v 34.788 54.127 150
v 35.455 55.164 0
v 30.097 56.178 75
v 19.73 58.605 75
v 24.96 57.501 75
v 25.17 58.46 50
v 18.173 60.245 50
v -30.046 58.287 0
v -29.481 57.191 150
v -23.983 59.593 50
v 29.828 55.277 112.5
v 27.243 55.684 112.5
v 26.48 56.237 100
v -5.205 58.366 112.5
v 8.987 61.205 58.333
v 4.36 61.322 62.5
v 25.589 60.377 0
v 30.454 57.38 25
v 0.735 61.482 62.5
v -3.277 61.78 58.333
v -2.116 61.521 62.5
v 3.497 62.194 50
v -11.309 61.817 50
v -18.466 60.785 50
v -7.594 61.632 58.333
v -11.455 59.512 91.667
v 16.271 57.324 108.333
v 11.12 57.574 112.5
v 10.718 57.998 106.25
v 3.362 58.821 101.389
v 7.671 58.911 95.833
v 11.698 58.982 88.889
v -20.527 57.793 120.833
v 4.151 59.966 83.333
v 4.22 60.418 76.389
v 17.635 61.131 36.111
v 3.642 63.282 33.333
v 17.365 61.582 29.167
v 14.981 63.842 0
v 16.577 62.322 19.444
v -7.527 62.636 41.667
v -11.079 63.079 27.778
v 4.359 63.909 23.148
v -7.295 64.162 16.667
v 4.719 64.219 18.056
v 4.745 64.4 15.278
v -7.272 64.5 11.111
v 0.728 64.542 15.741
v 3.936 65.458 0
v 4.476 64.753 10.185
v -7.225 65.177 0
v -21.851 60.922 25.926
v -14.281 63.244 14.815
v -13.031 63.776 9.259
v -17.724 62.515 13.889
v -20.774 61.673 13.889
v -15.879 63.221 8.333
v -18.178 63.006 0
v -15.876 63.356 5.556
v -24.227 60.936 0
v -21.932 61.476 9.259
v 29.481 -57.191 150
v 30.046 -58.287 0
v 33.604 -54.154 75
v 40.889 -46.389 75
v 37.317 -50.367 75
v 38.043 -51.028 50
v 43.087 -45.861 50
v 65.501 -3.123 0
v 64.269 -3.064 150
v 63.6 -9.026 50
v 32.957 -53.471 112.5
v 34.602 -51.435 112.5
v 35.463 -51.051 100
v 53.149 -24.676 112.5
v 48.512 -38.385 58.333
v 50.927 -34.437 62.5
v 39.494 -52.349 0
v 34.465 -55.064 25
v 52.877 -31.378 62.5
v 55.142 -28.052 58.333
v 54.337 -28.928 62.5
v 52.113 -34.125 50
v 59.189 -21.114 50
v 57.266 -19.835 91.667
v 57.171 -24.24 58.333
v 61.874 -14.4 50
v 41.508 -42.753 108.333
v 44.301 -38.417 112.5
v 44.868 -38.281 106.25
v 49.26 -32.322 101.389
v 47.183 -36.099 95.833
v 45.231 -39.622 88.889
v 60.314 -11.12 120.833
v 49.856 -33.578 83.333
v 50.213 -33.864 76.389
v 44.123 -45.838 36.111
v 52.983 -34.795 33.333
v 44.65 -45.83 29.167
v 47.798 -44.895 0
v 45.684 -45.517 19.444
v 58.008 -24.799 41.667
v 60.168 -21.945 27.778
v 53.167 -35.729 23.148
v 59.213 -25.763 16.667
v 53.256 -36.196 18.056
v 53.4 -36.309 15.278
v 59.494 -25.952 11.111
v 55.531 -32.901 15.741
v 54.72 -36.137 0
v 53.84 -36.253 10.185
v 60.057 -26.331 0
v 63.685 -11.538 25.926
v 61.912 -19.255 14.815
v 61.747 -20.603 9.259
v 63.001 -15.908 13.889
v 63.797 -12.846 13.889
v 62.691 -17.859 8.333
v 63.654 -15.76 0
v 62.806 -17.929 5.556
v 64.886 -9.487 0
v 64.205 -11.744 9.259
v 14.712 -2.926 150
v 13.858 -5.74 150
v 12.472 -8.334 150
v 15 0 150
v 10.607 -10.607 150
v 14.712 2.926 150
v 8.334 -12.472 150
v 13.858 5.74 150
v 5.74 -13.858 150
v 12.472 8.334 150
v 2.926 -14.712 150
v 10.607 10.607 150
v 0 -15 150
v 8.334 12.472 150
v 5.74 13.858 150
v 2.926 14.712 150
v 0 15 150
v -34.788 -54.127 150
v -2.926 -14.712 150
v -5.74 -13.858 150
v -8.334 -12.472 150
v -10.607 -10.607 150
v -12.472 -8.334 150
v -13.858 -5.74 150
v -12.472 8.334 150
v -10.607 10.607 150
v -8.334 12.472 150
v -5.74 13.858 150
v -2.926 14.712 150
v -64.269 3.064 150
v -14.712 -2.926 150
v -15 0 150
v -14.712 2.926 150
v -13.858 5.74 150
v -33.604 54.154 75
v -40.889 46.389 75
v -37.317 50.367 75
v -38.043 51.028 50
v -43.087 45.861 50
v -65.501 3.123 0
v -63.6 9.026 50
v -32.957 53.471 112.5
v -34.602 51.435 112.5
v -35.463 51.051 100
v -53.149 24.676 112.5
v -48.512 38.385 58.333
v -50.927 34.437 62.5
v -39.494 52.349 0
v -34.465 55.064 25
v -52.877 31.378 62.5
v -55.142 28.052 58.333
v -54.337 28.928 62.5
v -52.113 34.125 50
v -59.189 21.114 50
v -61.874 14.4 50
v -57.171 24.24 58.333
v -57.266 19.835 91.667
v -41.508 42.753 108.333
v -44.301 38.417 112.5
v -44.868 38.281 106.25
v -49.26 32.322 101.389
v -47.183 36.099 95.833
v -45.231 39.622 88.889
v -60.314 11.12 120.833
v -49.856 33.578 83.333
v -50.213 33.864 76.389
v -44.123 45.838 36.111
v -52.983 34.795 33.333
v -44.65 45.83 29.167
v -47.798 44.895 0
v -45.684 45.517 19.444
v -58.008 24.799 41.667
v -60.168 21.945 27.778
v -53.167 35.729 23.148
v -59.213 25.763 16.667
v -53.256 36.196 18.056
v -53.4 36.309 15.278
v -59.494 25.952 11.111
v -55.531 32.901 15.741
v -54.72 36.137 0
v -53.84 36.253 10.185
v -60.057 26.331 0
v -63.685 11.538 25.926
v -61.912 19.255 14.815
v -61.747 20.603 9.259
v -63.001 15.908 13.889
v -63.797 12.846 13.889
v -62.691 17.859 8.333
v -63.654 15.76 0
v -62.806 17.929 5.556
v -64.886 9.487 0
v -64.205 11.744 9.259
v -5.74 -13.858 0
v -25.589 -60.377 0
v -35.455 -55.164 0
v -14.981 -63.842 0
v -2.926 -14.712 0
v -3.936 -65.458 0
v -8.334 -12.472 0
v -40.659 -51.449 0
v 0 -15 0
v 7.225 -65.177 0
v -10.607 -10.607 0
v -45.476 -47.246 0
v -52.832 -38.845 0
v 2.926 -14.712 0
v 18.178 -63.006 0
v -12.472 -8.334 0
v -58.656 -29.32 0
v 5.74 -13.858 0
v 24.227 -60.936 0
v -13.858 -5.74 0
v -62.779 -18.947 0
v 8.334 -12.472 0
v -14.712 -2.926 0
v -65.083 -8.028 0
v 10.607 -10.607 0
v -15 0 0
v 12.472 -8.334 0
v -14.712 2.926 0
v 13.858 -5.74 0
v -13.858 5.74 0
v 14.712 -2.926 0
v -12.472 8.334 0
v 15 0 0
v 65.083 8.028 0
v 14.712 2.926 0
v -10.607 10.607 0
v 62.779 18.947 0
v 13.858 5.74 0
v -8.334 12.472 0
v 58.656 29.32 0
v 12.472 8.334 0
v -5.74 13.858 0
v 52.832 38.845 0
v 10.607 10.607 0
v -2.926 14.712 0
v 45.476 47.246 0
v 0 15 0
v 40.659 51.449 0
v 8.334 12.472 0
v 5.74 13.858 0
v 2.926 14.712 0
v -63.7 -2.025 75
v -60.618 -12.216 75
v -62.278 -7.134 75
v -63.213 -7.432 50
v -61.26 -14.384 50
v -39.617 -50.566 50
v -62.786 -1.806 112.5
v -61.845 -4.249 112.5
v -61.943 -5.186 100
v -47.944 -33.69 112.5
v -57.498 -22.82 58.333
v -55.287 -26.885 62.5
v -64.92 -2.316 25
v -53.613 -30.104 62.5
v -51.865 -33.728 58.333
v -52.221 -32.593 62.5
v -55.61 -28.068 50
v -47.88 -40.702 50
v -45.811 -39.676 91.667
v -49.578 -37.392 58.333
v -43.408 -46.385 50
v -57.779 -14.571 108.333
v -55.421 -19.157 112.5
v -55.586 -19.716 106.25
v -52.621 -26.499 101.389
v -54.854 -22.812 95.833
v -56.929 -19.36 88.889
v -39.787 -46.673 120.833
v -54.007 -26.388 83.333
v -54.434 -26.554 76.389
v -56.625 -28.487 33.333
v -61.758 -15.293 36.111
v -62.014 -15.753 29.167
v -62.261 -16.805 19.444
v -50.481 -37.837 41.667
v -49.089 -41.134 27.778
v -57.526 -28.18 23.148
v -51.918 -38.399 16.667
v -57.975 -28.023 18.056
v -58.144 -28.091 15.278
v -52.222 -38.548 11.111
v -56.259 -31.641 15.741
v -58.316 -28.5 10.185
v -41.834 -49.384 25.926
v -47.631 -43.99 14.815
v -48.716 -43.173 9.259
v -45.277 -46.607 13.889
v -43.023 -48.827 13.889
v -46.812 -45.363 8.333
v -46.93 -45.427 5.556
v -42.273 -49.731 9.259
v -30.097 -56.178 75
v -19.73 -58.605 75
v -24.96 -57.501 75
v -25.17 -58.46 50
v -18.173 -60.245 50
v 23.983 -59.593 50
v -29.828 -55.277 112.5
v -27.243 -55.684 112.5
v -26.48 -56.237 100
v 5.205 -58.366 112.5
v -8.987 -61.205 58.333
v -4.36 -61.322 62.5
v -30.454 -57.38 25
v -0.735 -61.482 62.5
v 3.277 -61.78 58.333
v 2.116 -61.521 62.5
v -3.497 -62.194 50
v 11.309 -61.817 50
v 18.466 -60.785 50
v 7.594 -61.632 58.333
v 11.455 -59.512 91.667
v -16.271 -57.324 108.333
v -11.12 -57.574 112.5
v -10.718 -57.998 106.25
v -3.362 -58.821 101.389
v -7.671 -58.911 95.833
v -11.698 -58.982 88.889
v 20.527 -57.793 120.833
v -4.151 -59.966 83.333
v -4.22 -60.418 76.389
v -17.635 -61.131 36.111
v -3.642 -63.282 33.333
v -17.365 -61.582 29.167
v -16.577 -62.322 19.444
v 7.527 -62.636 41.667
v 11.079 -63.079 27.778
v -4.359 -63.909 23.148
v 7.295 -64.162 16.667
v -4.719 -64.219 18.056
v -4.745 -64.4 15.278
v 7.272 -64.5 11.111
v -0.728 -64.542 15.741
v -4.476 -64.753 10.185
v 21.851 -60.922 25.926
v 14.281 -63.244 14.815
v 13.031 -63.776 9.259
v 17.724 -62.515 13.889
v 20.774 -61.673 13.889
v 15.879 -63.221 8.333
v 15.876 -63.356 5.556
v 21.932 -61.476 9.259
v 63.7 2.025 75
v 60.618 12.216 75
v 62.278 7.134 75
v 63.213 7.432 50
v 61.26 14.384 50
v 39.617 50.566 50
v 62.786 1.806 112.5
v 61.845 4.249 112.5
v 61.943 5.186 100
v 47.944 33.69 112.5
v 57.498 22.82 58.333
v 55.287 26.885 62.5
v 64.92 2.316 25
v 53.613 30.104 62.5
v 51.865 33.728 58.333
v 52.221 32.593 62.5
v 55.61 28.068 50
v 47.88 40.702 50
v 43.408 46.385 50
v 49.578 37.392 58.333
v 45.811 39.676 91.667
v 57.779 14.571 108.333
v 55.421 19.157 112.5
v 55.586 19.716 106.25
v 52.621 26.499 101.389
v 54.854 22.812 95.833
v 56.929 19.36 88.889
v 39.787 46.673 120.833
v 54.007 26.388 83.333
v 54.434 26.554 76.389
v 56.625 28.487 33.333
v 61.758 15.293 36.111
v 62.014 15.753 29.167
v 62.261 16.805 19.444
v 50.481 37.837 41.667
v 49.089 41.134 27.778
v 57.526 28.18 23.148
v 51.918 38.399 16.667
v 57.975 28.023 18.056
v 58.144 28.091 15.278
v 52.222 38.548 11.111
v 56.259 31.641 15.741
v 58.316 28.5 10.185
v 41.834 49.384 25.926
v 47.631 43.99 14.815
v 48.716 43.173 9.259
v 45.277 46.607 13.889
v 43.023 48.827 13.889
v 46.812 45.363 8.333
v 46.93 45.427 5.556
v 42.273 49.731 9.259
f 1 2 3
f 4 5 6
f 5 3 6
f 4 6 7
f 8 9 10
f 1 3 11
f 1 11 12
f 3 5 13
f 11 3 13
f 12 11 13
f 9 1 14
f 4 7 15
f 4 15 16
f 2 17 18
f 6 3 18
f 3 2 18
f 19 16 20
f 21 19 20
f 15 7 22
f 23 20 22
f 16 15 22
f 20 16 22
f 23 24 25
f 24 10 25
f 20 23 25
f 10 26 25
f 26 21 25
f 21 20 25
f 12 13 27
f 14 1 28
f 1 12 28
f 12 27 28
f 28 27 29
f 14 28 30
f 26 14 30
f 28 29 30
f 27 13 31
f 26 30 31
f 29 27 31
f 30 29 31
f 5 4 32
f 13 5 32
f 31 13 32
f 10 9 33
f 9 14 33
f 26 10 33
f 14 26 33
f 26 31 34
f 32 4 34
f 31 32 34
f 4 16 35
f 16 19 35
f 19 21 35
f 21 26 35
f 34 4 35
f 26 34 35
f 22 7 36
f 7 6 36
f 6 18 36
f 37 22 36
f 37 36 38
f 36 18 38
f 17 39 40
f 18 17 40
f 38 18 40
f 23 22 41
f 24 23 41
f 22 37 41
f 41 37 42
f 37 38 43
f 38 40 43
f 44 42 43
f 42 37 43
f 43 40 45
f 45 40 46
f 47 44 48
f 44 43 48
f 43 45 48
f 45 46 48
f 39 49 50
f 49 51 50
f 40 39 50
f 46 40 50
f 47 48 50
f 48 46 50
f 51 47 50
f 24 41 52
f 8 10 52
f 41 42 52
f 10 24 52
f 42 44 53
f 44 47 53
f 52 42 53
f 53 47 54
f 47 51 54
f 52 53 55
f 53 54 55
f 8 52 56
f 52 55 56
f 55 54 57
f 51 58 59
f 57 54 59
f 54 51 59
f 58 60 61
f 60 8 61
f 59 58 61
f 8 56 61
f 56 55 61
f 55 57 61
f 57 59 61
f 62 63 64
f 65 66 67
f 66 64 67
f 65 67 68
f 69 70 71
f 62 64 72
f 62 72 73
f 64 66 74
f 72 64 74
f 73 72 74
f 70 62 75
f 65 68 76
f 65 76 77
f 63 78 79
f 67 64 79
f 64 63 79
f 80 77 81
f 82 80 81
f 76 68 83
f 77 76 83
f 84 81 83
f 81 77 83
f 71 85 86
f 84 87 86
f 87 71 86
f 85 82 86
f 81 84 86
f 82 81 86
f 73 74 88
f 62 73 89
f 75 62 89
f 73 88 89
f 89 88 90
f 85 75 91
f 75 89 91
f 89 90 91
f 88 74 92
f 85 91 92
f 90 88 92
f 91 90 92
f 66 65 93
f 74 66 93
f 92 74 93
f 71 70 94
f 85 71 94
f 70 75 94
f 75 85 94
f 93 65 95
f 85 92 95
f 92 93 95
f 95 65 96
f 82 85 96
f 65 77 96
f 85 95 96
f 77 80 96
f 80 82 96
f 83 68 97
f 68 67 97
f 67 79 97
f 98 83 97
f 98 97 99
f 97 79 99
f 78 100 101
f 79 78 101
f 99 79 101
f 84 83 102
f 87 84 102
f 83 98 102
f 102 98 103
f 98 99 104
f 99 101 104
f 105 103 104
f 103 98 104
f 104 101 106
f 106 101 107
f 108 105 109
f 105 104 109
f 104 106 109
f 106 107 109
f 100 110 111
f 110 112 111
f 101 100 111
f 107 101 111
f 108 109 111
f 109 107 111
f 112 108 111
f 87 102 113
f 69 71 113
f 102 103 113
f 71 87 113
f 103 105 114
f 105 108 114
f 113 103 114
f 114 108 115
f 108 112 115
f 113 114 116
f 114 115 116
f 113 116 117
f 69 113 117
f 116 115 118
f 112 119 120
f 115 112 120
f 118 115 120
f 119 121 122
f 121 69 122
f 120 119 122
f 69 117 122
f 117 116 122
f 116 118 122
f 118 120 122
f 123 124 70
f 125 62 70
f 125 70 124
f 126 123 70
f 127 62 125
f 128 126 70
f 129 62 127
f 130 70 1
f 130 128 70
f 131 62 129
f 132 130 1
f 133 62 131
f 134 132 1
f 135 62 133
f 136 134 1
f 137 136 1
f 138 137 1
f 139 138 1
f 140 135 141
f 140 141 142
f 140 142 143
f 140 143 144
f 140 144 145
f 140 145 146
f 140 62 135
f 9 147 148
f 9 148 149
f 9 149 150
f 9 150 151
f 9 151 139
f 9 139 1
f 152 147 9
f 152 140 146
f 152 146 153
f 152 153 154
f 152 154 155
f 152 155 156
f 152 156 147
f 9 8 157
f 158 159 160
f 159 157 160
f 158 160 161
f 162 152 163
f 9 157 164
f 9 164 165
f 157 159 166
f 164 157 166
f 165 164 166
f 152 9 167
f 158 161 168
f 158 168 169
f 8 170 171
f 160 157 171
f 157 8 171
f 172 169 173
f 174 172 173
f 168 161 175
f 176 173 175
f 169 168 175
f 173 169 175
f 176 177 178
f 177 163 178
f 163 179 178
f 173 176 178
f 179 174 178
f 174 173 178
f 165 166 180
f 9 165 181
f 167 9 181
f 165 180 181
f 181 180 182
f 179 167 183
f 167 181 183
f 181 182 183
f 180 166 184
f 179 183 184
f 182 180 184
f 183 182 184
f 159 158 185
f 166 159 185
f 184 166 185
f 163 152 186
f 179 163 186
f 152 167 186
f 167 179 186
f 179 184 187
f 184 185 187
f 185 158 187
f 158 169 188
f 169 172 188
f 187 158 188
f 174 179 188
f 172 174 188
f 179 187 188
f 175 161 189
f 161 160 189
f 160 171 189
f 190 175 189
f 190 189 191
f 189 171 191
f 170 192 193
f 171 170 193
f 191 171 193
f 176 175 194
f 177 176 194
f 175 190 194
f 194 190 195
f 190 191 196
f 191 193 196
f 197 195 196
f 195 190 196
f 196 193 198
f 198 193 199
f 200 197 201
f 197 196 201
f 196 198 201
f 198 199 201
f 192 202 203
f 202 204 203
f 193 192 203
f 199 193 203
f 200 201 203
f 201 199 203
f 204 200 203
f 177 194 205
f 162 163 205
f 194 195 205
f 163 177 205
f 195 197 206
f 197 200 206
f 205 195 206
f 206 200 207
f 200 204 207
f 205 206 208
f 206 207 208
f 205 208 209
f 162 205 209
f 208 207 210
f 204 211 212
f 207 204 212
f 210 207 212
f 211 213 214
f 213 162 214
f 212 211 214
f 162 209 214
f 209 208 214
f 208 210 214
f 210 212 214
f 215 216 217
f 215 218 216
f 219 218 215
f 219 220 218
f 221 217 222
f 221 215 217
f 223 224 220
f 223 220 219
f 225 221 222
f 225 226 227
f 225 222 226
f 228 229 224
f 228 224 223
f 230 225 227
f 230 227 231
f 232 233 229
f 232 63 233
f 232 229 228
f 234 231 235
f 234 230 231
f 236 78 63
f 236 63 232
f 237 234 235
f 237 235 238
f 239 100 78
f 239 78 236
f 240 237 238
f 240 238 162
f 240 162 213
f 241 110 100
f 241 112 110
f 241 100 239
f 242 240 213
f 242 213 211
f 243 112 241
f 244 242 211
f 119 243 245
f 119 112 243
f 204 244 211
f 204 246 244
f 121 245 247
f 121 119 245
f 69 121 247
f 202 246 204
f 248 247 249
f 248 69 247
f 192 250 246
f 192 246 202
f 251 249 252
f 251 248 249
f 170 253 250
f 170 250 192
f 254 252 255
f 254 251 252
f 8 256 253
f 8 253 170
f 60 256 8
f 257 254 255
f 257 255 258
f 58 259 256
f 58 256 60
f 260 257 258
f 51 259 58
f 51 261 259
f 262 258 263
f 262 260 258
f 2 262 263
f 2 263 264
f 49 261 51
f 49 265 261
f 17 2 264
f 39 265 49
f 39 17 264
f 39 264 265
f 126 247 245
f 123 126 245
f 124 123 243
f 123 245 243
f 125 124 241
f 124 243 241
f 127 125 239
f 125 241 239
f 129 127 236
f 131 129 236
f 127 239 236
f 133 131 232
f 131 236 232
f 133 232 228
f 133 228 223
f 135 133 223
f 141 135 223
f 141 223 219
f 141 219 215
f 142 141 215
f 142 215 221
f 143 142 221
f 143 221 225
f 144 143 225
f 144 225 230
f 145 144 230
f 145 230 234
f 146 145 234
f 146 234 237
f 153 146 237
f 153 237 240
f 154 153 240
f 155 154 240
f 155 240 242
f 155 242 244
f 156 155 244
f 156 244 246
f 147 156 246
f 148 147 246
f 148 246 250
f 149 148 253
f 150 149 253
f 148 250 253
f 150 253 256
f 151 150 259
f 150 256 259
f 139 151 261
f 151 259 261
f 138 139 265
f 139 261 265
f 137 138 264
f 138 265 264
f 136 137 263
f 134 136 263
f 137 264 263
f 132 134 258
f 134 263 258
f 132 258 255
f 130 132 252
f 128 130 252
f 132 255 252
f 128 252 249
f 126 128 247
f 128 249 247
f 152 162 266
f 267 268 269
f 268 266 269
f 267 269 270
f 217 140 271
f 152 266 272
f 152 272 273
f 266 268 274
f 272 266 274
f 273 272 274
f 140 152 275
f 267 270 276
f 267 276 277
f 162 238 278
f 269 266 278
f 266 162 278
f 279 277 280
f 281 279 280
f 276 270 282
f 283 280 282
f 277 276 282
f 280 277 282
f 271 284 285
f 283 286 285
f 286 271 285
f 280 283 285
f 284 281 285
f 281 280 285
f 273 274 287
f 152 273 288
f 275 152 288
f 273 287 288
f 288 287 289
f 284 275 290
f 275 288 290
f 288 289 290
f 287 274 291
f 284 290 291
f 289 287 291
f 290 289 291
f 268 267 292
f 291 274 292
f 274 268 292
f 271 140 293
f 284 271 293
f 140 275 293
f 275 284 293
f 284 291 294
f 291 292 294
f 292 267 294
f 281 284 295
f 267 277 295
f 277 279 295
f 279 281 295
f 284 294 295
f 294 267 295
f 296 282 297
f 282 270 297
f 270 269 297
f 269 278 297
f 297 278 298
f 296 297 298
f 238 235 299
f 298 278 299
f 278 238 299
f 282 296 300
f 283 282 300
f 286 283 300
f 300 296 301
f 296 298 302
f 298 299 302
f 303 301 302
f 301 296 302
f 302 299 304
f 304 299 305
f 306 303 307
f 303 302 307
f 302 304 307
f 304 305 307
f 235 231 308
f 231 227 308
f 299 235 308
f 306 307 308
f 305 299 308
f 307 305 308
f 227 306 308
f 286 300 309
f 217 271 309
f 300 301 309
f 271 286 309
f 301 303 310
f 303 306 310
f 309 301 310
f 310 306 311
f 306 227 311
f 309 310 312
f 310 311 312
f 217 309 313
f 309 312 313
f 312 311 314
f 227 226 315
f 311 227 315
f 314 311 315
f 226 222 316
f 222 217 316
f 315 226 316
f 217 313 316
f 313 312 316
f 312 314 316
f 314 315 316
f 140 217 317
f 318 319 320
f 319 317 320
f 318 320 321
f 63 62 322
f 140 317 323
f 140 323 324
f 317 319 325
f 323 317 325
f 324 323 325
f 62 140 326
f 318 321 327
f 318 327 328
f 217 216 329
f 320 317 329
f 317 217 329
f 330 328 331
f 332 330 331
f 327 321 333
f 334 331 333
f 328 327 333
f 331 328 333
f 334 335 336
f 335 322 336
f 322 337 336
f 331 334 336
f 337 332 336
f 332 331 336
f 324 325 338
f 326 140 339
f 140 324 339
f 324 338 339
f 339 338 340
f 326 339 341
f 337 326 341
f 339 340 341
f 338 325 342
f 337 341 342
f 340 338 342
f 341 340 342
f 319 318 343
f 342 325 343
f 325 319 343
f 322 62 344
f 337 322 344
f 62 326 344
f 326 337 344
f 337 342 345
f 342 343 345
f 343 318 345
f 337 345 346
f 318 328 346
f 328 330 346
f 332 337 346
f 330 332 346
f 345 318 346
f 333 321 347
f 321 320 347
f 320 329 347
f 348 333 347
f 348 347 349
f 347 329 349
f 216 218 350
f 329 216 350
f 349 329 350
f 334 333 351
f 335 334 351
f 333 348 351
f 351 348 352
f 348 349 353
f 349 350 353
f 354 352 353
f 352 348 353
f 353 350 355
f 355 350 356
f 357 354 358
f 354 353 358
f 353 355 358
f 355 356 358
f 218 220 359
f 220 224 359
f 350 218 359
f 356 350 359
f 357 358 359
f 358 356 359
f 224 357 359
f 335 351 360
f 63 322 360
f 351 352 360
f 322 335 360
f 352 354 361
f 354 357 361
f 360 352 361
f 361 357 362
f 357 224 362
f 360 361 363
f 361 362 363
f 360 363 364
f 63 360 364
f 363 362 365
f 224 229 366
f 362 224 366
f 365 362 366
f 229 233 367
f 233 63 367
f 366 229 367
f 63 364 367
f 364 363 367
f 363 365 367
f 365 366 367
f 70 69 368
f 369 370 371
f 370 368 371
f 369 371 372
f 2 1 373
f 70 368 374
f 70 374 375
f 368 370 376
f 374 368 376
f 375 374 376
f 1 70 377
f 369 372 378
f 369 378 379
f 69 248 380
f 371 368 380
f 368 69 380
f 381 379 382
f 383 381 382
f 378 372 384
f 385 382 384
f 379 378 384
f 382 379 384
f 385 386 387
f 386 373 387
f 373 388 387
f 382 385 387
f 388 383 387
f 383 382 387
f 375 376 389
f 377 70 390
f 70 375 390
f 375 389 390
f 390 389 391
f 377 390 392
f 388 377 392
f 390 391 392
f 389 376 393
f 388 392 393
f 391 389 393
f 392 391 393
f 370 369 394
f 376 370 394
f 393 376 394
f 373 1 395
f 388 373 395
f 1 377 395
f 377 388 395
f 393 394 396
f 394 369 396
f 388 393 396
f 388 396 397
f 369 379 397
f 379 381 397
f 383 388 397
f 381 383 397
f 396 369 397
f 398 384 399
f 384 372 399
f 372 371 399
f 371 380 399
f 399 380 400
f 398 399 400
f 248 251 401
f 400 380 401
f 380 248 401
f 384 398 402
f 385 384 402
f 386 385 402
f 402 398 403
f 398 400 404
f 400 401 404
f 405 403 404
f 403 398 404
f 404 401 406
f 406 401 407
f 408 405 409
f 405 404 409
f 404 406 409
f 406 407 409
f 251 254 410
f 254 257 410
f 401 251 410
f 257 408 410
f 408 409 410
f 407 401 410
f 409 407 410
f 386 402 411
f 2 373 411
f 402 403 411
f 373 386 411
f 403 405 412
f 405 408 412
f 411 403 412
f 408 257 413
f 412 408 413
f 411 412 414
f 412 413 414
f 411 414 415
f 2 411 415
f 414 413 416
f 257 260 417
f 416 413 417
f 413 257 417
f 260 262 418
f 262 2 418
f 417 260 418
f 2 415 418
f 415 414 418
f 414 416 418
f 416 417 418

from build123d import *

# Parameters (mm, degrees)
F4_R     = 15
F5_DEPTH = 208


# Not quite as in the source:
# - the arcs of a loft's sections are written as splines that run evenly, so that the points pair up as in the source's solid


with BuildPart() as f3:
    # F2 (on offset) → F3 section 0
    with BuildSketch(Plane.XY.offset(150)):
        Polygon((29.4808263494, -57.1909035932), (64.2691885518, -3.0643072535), (34.7883622024, 54.1265963397), (-29.4808263494, 57.1909035932), (-64.2691885518, 3.0643072535), (-34.7883622024, -54.1265963397), align=None)
    # F1 (on Top) → F3 section 1
    with BuildSketch(Plane.XY):
        with BuildLine():
            add(Edge.make_bspline(
                [(30.0460333415, -58.2873687402), (33.4370549976, -56.5393613769), (36.6750958203, -54.4947096368), (42.7470280691, -49.8741177675), (45.5808257272, -47.2982489935), (50.7581543238, -41.6934743272), (53.1016053094, -38.6646549886), (57.2270197442, -32.2459957674), (59.008919485, -28.8562550072), (61.9570711279, -21.8187389434), (63.123277502, -18.1710723193), (64.8045882572, -10.7285307775), (65.319666674, -6.933770794), (65.5013587195, -3.1230562134)],
                knots=[0, 0, 0, 0, 0.1666666667, 0.1666666667, 0.3333333333, 0.3333333333, 0.5, 0.5, 0.6666666667, 0.6666666667, 0.8333333333, 0.8333333333, 1, 1, 1, 1], degree=3))
            add(Edge.make_bspline(
                [(65.5013587195, -3.1230562134), (65.683050765, 0.6876583672), (65.5313508275, 4.5142098482), (64.5657670125, 12.0829533604), (63.7518980465, 15.8250285085), (61.4866851013, 23.11111393), (60.0353761034, 26.6550116854), (56.5393613769, 33.4370549976), (54.4947096368, 36.6750958203), (49.8741177675, 42.7470280691), (47.2982489935, 45.5808257272), (41.6934743272, 50.7581543238), (38.6646549886, 53.1016053094), (35.455325378, 55.1643125268)],
                knots=[0, 0, 0, 0, 0.1666666667, 0.1666666667, 0.3333333333, 0.3333333333, 0.5, 0.5, 0.6666666667, 0.6666666667, 0.8333333333, 0.8333333333, 1, 1, 1, 1], degree=3))
            add(Edge.make_bspline(
                [(35.455325378, 55.1643125268), (32.2459957674, 57.2270197442), (28.8562550072, 59.008919485), (21.8187389434, 61.9570711279), (18.1710723193, 63.123277502), (10.7285307775, 64.8045882572), (6.933770794, 65.319666674), (-0.6876583672, 65.683050765), (-4.5142098482, 65.5313508275), (-12.0829533604, 64.5657670125), (-15.8250285085, 63.7518980465), (-23.11111393, 61.4866851013), (-26.6550116854, 60.0353761034), (-30.0460333415, 58.2873687402)],
                knots=[0, 0, 0, 0, 0.1666666667, 0.1666666667, 0.3333333333, 0.3333333333, 0.5, 0.5, 0.6666666667, 0.6666666667, 0.8333333333, 0.8333333333, 1, 1, 1, 1], degree=3))
            add(Edge.make_bspline(
                [(-30.0460333415, 58.2873687402), (-33.4370549976, 56.5393613769), (-36.6750958203, 54.4947096368), (-42.7470280691, 49.8741177675), (-45.5808257272, 47.2982489935), (-50.7581543238, 41.6934743272), (-53.1016053094, 38.6646549886), (-57.2270197442, 32.2459957674), (-59.008919485, 28.8562550072), (-61.9570711279, 21.8187389434), (-63.123277502, 18.1710723193), (-64.8045882572, 10.7285307775), (-65.319666674, 6.933770794), (-65.5013587195, 3.1230562134)],
                knots=[0, 0, 0, 0, 0.1666666667, 0.1666666667, 0.3333333333, 0.3333333333, 0.5, 0.5, 0.6666666667, 0.6666666667, 0.8333333333, 0.8333333333, 1, 1, 1, 1], degree=3))
            add(Edge.make_bspline(
                [(-65.5013587195, 3.1230562134), (-65.683050765, -0.6876583672), (-65.5313508275, -4.5142098482), (-64.5657670125, -12.0829533604), (-63.7518980465, -15.8250285085), (-61.4866851013, -23.11111393), (-60.0353761034, -26.6550116854), (-56.5393613769, -33.4370549976), (-54.4947096368, -36.6750958203), (-49.8741177675, -42.7470280691), (-47.2982489935, -45.5808257272), (-41.6934743272, -50.7581543238), (-38.6646549886, -53.1016053094), (-35.455325378, -55.1643125268)],
                knots=[0, 0, 0, 0, 0.1666666667, 0.1666666667, 0.3333333333, 0.3333333333, 0.5, 0.5, 0.6666666667, 0.6666666667, 0.8333333333, 0.8333333333, 1, 1, 1, 1], degree=3))
            add(Edge.make_bspline(
                [(-35.455325378, -55.1643125268), (-32.2459957674, -57.2270197442), (-28.8562550072, -59.008919485), (-21.8187389434, -61.9570711279), (-18.1710723193, -63.123277502), (-10.7285307775, -64.8045882572), (-6.933770794, -65.319666674), (0.6876583672, -65.683050765), (4.5142098482, -65.5313508275), (12.0829533604, -64.5657670125), (15.8250285085, -63.7518980465), (23.11111393, -61.4866851013), (26.6550116854, -60.0353761034), (30.0460333415, -58.2873687402)],
                knots=[0, 0, 0, 0, 0.1666666667, 0.1666666667, 0.3333333333, 0.3333333333, 0.5, 0.5, 0.6666666667, 0.6666666667, 0.8333333333, 0.8333333333, 1, 1, 1, 1], degree=3))
        make_face()
    loft(ruled=True)

    # F4 (on face) → F5 (cut)
    with BuildSketch(Plane(origin=(0, 0, 0), x_dir=(1, 0, 0), z_dir=(0, 0, -1))):
        Circle(F4_R)
    extrude(amount=-F5_DEPTH, mode=Mode.SUBTRACT)


solid = f3.part
